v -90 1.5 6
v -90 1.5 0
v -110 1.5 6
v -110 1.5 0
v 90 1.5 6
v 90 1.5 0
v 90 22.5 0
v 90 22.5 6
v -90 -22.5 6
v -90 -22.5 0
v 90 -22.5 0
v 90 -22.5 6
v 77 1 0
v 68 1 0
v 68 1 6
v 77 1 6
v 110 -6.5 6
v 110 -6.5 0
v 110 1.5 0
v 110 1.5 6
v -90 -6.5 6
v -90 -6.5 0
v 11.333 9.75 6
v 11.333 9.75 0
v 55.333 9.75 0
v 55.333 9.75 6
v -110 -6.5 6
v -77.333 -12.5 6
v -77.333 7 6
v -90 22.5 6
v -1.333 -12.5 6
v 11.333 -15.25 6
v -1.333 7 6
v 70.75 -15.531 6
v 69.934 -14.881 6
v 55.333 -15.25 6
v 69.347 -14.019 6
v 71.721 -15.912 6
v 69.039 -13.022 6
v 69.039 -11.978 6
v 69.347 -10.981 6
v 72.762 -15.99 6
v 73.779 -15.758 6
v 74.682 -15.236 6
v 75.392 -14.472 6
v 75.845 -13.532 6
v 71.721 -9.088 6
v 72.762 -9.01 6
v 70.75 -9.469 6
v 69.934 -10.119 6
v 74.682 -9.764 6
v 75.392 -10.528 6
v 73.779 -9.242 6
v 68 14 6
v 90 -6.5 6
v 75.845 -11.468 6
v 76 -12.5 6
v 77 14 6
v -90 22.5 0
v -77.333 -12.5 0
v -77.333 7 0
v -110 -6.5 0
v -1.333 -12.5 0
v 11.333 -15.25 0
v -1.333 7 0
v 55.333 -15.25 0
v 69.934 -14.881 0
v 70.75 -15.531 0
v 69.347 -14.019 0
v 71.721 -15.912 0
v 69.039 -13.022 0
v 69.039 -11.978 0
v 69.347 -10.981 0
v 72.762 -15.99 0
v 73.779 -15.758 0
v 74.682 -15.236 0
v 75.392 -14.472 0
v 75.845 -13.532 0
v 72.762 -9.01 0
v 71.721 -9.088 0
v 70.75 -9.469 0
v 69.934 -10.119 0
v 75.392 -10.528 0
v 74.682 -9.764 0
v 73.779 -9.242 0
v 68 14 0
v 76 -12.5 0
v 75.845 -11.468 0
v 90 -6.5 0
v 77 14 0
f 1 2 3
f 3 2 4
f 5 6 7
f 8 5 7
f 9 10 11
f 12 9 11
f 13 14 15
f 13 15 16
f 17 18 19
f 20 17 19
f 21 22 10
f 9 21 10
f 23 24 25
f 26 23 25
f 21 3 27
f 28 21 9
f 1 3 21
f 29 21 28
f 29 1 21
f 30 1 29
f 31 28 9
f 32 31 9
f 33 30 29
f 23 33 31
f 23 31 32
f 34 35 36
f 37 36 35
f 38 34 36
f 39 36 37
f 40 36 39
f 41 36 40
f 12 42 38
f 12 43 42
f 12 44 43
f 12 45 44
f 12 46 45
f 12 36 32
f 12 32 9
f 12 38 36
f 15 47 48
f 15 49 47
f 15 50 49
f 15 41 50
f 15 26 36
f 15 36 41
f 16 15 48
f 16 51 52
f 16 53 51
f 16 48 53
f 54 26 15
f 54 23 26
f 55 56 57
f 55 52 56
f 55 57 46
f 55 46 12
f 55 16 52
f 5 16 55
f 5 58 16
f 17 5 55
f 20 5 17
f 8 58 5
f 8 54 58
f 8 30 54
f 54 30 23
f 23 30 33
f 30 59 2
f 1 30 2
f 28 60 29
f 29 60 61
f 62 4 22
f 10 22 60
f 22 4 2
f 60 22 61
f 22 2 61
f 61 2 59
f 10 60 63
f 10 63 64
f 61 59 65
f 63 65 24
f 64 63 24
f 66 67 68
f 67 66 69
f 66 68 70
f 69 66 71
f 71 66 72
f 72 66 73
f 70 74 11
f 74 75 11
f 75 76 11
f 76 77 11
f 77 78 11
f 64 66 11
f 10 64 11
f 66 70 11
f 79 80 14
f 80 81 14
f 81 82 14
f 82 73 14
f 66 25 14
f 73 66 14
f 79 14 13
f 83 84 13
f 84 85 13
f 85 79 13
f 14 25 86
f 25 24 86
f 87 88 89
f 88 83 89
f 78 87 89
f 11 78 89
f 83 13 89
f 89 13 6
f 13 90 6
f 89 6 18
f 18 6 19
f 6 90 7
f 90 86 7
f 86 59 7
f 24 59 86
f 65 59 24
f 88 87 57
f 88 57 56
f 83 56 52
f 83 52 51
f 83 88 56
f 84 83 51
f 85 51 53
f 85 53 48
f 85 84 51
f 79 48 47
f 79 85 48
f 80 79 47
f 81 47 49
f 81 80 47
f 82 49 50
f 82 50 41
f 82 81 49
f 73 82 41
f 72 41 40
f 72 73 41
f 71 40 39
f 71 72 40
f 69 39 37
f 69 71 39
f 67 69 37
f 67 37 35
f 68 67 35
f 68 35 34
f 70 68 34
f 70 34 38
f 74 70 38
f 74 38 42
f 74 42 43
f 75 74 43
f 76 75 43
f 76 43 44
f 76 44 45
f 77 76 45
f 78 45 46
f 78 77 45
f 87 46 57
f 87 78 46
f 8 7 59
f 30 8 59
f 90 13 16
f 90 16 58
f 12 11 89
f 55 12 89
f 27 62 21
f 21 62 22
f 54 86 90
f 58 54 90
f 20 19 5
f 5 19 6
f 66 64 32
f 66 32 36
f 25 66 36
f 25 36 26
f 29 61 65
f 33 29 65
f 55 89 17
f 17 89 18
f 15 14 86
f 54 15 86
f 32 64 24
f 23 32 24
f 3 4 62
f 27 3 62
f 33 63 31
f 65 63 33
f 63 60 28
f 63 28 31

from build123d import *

# Parameters (mm, degrees)
ESBO_O1_R                = 3.5
ESBO_O1_W                = 76
ESBO_O1_H                = 19.5
ESBO_O1_W_2              = 44
ESBO_O1_H_2              = 25
ESBO_O1_W_3              = 9
ESBO_O1_H_3              = 13
RESSALTO_EXTRUS_O1_DEPTH = 6


with BuildPart() as part:
    # Esboço1 → Ressalto-extrusão1 (new body)
    with BuildSketch(Plane.XY):
        Polygon((-90, -6.5), (-90, -22.5), (90, -22.5), (90, -6.5), (110, -6.5), (110, 1.5), (90, 1.5), (90, 22.5), (-90, 22.5), (-90, 1.5), (-110, 1.5), (-110, -6.5), align=None)
        with Locations((72.5, -12.5)):
            Circle(ESBO_O1_R, mode=Mode.SUBTRACT)
        with Locations((-39.333333333, -2.75)):
            Rectangle(ESBO_O1_W, ESBO_O1_H, mode=Mode.SUBTRACT)
        with Locations((33.333333333, -2.75)):
            Rectangle(ESBO_O1_W_2, ESBO_O1_H_2, mode=Mode.SUBTRACT)
        with Locations((72.5, 7.5)):
            Rectangle(ESBO_O1_W_3, ESBO_O1_H_3, mode=Mode.SUBTRACT)
    extrude(amount=RESSALTO_EXTRUS_O1_DEPTH)


solid = part.part
